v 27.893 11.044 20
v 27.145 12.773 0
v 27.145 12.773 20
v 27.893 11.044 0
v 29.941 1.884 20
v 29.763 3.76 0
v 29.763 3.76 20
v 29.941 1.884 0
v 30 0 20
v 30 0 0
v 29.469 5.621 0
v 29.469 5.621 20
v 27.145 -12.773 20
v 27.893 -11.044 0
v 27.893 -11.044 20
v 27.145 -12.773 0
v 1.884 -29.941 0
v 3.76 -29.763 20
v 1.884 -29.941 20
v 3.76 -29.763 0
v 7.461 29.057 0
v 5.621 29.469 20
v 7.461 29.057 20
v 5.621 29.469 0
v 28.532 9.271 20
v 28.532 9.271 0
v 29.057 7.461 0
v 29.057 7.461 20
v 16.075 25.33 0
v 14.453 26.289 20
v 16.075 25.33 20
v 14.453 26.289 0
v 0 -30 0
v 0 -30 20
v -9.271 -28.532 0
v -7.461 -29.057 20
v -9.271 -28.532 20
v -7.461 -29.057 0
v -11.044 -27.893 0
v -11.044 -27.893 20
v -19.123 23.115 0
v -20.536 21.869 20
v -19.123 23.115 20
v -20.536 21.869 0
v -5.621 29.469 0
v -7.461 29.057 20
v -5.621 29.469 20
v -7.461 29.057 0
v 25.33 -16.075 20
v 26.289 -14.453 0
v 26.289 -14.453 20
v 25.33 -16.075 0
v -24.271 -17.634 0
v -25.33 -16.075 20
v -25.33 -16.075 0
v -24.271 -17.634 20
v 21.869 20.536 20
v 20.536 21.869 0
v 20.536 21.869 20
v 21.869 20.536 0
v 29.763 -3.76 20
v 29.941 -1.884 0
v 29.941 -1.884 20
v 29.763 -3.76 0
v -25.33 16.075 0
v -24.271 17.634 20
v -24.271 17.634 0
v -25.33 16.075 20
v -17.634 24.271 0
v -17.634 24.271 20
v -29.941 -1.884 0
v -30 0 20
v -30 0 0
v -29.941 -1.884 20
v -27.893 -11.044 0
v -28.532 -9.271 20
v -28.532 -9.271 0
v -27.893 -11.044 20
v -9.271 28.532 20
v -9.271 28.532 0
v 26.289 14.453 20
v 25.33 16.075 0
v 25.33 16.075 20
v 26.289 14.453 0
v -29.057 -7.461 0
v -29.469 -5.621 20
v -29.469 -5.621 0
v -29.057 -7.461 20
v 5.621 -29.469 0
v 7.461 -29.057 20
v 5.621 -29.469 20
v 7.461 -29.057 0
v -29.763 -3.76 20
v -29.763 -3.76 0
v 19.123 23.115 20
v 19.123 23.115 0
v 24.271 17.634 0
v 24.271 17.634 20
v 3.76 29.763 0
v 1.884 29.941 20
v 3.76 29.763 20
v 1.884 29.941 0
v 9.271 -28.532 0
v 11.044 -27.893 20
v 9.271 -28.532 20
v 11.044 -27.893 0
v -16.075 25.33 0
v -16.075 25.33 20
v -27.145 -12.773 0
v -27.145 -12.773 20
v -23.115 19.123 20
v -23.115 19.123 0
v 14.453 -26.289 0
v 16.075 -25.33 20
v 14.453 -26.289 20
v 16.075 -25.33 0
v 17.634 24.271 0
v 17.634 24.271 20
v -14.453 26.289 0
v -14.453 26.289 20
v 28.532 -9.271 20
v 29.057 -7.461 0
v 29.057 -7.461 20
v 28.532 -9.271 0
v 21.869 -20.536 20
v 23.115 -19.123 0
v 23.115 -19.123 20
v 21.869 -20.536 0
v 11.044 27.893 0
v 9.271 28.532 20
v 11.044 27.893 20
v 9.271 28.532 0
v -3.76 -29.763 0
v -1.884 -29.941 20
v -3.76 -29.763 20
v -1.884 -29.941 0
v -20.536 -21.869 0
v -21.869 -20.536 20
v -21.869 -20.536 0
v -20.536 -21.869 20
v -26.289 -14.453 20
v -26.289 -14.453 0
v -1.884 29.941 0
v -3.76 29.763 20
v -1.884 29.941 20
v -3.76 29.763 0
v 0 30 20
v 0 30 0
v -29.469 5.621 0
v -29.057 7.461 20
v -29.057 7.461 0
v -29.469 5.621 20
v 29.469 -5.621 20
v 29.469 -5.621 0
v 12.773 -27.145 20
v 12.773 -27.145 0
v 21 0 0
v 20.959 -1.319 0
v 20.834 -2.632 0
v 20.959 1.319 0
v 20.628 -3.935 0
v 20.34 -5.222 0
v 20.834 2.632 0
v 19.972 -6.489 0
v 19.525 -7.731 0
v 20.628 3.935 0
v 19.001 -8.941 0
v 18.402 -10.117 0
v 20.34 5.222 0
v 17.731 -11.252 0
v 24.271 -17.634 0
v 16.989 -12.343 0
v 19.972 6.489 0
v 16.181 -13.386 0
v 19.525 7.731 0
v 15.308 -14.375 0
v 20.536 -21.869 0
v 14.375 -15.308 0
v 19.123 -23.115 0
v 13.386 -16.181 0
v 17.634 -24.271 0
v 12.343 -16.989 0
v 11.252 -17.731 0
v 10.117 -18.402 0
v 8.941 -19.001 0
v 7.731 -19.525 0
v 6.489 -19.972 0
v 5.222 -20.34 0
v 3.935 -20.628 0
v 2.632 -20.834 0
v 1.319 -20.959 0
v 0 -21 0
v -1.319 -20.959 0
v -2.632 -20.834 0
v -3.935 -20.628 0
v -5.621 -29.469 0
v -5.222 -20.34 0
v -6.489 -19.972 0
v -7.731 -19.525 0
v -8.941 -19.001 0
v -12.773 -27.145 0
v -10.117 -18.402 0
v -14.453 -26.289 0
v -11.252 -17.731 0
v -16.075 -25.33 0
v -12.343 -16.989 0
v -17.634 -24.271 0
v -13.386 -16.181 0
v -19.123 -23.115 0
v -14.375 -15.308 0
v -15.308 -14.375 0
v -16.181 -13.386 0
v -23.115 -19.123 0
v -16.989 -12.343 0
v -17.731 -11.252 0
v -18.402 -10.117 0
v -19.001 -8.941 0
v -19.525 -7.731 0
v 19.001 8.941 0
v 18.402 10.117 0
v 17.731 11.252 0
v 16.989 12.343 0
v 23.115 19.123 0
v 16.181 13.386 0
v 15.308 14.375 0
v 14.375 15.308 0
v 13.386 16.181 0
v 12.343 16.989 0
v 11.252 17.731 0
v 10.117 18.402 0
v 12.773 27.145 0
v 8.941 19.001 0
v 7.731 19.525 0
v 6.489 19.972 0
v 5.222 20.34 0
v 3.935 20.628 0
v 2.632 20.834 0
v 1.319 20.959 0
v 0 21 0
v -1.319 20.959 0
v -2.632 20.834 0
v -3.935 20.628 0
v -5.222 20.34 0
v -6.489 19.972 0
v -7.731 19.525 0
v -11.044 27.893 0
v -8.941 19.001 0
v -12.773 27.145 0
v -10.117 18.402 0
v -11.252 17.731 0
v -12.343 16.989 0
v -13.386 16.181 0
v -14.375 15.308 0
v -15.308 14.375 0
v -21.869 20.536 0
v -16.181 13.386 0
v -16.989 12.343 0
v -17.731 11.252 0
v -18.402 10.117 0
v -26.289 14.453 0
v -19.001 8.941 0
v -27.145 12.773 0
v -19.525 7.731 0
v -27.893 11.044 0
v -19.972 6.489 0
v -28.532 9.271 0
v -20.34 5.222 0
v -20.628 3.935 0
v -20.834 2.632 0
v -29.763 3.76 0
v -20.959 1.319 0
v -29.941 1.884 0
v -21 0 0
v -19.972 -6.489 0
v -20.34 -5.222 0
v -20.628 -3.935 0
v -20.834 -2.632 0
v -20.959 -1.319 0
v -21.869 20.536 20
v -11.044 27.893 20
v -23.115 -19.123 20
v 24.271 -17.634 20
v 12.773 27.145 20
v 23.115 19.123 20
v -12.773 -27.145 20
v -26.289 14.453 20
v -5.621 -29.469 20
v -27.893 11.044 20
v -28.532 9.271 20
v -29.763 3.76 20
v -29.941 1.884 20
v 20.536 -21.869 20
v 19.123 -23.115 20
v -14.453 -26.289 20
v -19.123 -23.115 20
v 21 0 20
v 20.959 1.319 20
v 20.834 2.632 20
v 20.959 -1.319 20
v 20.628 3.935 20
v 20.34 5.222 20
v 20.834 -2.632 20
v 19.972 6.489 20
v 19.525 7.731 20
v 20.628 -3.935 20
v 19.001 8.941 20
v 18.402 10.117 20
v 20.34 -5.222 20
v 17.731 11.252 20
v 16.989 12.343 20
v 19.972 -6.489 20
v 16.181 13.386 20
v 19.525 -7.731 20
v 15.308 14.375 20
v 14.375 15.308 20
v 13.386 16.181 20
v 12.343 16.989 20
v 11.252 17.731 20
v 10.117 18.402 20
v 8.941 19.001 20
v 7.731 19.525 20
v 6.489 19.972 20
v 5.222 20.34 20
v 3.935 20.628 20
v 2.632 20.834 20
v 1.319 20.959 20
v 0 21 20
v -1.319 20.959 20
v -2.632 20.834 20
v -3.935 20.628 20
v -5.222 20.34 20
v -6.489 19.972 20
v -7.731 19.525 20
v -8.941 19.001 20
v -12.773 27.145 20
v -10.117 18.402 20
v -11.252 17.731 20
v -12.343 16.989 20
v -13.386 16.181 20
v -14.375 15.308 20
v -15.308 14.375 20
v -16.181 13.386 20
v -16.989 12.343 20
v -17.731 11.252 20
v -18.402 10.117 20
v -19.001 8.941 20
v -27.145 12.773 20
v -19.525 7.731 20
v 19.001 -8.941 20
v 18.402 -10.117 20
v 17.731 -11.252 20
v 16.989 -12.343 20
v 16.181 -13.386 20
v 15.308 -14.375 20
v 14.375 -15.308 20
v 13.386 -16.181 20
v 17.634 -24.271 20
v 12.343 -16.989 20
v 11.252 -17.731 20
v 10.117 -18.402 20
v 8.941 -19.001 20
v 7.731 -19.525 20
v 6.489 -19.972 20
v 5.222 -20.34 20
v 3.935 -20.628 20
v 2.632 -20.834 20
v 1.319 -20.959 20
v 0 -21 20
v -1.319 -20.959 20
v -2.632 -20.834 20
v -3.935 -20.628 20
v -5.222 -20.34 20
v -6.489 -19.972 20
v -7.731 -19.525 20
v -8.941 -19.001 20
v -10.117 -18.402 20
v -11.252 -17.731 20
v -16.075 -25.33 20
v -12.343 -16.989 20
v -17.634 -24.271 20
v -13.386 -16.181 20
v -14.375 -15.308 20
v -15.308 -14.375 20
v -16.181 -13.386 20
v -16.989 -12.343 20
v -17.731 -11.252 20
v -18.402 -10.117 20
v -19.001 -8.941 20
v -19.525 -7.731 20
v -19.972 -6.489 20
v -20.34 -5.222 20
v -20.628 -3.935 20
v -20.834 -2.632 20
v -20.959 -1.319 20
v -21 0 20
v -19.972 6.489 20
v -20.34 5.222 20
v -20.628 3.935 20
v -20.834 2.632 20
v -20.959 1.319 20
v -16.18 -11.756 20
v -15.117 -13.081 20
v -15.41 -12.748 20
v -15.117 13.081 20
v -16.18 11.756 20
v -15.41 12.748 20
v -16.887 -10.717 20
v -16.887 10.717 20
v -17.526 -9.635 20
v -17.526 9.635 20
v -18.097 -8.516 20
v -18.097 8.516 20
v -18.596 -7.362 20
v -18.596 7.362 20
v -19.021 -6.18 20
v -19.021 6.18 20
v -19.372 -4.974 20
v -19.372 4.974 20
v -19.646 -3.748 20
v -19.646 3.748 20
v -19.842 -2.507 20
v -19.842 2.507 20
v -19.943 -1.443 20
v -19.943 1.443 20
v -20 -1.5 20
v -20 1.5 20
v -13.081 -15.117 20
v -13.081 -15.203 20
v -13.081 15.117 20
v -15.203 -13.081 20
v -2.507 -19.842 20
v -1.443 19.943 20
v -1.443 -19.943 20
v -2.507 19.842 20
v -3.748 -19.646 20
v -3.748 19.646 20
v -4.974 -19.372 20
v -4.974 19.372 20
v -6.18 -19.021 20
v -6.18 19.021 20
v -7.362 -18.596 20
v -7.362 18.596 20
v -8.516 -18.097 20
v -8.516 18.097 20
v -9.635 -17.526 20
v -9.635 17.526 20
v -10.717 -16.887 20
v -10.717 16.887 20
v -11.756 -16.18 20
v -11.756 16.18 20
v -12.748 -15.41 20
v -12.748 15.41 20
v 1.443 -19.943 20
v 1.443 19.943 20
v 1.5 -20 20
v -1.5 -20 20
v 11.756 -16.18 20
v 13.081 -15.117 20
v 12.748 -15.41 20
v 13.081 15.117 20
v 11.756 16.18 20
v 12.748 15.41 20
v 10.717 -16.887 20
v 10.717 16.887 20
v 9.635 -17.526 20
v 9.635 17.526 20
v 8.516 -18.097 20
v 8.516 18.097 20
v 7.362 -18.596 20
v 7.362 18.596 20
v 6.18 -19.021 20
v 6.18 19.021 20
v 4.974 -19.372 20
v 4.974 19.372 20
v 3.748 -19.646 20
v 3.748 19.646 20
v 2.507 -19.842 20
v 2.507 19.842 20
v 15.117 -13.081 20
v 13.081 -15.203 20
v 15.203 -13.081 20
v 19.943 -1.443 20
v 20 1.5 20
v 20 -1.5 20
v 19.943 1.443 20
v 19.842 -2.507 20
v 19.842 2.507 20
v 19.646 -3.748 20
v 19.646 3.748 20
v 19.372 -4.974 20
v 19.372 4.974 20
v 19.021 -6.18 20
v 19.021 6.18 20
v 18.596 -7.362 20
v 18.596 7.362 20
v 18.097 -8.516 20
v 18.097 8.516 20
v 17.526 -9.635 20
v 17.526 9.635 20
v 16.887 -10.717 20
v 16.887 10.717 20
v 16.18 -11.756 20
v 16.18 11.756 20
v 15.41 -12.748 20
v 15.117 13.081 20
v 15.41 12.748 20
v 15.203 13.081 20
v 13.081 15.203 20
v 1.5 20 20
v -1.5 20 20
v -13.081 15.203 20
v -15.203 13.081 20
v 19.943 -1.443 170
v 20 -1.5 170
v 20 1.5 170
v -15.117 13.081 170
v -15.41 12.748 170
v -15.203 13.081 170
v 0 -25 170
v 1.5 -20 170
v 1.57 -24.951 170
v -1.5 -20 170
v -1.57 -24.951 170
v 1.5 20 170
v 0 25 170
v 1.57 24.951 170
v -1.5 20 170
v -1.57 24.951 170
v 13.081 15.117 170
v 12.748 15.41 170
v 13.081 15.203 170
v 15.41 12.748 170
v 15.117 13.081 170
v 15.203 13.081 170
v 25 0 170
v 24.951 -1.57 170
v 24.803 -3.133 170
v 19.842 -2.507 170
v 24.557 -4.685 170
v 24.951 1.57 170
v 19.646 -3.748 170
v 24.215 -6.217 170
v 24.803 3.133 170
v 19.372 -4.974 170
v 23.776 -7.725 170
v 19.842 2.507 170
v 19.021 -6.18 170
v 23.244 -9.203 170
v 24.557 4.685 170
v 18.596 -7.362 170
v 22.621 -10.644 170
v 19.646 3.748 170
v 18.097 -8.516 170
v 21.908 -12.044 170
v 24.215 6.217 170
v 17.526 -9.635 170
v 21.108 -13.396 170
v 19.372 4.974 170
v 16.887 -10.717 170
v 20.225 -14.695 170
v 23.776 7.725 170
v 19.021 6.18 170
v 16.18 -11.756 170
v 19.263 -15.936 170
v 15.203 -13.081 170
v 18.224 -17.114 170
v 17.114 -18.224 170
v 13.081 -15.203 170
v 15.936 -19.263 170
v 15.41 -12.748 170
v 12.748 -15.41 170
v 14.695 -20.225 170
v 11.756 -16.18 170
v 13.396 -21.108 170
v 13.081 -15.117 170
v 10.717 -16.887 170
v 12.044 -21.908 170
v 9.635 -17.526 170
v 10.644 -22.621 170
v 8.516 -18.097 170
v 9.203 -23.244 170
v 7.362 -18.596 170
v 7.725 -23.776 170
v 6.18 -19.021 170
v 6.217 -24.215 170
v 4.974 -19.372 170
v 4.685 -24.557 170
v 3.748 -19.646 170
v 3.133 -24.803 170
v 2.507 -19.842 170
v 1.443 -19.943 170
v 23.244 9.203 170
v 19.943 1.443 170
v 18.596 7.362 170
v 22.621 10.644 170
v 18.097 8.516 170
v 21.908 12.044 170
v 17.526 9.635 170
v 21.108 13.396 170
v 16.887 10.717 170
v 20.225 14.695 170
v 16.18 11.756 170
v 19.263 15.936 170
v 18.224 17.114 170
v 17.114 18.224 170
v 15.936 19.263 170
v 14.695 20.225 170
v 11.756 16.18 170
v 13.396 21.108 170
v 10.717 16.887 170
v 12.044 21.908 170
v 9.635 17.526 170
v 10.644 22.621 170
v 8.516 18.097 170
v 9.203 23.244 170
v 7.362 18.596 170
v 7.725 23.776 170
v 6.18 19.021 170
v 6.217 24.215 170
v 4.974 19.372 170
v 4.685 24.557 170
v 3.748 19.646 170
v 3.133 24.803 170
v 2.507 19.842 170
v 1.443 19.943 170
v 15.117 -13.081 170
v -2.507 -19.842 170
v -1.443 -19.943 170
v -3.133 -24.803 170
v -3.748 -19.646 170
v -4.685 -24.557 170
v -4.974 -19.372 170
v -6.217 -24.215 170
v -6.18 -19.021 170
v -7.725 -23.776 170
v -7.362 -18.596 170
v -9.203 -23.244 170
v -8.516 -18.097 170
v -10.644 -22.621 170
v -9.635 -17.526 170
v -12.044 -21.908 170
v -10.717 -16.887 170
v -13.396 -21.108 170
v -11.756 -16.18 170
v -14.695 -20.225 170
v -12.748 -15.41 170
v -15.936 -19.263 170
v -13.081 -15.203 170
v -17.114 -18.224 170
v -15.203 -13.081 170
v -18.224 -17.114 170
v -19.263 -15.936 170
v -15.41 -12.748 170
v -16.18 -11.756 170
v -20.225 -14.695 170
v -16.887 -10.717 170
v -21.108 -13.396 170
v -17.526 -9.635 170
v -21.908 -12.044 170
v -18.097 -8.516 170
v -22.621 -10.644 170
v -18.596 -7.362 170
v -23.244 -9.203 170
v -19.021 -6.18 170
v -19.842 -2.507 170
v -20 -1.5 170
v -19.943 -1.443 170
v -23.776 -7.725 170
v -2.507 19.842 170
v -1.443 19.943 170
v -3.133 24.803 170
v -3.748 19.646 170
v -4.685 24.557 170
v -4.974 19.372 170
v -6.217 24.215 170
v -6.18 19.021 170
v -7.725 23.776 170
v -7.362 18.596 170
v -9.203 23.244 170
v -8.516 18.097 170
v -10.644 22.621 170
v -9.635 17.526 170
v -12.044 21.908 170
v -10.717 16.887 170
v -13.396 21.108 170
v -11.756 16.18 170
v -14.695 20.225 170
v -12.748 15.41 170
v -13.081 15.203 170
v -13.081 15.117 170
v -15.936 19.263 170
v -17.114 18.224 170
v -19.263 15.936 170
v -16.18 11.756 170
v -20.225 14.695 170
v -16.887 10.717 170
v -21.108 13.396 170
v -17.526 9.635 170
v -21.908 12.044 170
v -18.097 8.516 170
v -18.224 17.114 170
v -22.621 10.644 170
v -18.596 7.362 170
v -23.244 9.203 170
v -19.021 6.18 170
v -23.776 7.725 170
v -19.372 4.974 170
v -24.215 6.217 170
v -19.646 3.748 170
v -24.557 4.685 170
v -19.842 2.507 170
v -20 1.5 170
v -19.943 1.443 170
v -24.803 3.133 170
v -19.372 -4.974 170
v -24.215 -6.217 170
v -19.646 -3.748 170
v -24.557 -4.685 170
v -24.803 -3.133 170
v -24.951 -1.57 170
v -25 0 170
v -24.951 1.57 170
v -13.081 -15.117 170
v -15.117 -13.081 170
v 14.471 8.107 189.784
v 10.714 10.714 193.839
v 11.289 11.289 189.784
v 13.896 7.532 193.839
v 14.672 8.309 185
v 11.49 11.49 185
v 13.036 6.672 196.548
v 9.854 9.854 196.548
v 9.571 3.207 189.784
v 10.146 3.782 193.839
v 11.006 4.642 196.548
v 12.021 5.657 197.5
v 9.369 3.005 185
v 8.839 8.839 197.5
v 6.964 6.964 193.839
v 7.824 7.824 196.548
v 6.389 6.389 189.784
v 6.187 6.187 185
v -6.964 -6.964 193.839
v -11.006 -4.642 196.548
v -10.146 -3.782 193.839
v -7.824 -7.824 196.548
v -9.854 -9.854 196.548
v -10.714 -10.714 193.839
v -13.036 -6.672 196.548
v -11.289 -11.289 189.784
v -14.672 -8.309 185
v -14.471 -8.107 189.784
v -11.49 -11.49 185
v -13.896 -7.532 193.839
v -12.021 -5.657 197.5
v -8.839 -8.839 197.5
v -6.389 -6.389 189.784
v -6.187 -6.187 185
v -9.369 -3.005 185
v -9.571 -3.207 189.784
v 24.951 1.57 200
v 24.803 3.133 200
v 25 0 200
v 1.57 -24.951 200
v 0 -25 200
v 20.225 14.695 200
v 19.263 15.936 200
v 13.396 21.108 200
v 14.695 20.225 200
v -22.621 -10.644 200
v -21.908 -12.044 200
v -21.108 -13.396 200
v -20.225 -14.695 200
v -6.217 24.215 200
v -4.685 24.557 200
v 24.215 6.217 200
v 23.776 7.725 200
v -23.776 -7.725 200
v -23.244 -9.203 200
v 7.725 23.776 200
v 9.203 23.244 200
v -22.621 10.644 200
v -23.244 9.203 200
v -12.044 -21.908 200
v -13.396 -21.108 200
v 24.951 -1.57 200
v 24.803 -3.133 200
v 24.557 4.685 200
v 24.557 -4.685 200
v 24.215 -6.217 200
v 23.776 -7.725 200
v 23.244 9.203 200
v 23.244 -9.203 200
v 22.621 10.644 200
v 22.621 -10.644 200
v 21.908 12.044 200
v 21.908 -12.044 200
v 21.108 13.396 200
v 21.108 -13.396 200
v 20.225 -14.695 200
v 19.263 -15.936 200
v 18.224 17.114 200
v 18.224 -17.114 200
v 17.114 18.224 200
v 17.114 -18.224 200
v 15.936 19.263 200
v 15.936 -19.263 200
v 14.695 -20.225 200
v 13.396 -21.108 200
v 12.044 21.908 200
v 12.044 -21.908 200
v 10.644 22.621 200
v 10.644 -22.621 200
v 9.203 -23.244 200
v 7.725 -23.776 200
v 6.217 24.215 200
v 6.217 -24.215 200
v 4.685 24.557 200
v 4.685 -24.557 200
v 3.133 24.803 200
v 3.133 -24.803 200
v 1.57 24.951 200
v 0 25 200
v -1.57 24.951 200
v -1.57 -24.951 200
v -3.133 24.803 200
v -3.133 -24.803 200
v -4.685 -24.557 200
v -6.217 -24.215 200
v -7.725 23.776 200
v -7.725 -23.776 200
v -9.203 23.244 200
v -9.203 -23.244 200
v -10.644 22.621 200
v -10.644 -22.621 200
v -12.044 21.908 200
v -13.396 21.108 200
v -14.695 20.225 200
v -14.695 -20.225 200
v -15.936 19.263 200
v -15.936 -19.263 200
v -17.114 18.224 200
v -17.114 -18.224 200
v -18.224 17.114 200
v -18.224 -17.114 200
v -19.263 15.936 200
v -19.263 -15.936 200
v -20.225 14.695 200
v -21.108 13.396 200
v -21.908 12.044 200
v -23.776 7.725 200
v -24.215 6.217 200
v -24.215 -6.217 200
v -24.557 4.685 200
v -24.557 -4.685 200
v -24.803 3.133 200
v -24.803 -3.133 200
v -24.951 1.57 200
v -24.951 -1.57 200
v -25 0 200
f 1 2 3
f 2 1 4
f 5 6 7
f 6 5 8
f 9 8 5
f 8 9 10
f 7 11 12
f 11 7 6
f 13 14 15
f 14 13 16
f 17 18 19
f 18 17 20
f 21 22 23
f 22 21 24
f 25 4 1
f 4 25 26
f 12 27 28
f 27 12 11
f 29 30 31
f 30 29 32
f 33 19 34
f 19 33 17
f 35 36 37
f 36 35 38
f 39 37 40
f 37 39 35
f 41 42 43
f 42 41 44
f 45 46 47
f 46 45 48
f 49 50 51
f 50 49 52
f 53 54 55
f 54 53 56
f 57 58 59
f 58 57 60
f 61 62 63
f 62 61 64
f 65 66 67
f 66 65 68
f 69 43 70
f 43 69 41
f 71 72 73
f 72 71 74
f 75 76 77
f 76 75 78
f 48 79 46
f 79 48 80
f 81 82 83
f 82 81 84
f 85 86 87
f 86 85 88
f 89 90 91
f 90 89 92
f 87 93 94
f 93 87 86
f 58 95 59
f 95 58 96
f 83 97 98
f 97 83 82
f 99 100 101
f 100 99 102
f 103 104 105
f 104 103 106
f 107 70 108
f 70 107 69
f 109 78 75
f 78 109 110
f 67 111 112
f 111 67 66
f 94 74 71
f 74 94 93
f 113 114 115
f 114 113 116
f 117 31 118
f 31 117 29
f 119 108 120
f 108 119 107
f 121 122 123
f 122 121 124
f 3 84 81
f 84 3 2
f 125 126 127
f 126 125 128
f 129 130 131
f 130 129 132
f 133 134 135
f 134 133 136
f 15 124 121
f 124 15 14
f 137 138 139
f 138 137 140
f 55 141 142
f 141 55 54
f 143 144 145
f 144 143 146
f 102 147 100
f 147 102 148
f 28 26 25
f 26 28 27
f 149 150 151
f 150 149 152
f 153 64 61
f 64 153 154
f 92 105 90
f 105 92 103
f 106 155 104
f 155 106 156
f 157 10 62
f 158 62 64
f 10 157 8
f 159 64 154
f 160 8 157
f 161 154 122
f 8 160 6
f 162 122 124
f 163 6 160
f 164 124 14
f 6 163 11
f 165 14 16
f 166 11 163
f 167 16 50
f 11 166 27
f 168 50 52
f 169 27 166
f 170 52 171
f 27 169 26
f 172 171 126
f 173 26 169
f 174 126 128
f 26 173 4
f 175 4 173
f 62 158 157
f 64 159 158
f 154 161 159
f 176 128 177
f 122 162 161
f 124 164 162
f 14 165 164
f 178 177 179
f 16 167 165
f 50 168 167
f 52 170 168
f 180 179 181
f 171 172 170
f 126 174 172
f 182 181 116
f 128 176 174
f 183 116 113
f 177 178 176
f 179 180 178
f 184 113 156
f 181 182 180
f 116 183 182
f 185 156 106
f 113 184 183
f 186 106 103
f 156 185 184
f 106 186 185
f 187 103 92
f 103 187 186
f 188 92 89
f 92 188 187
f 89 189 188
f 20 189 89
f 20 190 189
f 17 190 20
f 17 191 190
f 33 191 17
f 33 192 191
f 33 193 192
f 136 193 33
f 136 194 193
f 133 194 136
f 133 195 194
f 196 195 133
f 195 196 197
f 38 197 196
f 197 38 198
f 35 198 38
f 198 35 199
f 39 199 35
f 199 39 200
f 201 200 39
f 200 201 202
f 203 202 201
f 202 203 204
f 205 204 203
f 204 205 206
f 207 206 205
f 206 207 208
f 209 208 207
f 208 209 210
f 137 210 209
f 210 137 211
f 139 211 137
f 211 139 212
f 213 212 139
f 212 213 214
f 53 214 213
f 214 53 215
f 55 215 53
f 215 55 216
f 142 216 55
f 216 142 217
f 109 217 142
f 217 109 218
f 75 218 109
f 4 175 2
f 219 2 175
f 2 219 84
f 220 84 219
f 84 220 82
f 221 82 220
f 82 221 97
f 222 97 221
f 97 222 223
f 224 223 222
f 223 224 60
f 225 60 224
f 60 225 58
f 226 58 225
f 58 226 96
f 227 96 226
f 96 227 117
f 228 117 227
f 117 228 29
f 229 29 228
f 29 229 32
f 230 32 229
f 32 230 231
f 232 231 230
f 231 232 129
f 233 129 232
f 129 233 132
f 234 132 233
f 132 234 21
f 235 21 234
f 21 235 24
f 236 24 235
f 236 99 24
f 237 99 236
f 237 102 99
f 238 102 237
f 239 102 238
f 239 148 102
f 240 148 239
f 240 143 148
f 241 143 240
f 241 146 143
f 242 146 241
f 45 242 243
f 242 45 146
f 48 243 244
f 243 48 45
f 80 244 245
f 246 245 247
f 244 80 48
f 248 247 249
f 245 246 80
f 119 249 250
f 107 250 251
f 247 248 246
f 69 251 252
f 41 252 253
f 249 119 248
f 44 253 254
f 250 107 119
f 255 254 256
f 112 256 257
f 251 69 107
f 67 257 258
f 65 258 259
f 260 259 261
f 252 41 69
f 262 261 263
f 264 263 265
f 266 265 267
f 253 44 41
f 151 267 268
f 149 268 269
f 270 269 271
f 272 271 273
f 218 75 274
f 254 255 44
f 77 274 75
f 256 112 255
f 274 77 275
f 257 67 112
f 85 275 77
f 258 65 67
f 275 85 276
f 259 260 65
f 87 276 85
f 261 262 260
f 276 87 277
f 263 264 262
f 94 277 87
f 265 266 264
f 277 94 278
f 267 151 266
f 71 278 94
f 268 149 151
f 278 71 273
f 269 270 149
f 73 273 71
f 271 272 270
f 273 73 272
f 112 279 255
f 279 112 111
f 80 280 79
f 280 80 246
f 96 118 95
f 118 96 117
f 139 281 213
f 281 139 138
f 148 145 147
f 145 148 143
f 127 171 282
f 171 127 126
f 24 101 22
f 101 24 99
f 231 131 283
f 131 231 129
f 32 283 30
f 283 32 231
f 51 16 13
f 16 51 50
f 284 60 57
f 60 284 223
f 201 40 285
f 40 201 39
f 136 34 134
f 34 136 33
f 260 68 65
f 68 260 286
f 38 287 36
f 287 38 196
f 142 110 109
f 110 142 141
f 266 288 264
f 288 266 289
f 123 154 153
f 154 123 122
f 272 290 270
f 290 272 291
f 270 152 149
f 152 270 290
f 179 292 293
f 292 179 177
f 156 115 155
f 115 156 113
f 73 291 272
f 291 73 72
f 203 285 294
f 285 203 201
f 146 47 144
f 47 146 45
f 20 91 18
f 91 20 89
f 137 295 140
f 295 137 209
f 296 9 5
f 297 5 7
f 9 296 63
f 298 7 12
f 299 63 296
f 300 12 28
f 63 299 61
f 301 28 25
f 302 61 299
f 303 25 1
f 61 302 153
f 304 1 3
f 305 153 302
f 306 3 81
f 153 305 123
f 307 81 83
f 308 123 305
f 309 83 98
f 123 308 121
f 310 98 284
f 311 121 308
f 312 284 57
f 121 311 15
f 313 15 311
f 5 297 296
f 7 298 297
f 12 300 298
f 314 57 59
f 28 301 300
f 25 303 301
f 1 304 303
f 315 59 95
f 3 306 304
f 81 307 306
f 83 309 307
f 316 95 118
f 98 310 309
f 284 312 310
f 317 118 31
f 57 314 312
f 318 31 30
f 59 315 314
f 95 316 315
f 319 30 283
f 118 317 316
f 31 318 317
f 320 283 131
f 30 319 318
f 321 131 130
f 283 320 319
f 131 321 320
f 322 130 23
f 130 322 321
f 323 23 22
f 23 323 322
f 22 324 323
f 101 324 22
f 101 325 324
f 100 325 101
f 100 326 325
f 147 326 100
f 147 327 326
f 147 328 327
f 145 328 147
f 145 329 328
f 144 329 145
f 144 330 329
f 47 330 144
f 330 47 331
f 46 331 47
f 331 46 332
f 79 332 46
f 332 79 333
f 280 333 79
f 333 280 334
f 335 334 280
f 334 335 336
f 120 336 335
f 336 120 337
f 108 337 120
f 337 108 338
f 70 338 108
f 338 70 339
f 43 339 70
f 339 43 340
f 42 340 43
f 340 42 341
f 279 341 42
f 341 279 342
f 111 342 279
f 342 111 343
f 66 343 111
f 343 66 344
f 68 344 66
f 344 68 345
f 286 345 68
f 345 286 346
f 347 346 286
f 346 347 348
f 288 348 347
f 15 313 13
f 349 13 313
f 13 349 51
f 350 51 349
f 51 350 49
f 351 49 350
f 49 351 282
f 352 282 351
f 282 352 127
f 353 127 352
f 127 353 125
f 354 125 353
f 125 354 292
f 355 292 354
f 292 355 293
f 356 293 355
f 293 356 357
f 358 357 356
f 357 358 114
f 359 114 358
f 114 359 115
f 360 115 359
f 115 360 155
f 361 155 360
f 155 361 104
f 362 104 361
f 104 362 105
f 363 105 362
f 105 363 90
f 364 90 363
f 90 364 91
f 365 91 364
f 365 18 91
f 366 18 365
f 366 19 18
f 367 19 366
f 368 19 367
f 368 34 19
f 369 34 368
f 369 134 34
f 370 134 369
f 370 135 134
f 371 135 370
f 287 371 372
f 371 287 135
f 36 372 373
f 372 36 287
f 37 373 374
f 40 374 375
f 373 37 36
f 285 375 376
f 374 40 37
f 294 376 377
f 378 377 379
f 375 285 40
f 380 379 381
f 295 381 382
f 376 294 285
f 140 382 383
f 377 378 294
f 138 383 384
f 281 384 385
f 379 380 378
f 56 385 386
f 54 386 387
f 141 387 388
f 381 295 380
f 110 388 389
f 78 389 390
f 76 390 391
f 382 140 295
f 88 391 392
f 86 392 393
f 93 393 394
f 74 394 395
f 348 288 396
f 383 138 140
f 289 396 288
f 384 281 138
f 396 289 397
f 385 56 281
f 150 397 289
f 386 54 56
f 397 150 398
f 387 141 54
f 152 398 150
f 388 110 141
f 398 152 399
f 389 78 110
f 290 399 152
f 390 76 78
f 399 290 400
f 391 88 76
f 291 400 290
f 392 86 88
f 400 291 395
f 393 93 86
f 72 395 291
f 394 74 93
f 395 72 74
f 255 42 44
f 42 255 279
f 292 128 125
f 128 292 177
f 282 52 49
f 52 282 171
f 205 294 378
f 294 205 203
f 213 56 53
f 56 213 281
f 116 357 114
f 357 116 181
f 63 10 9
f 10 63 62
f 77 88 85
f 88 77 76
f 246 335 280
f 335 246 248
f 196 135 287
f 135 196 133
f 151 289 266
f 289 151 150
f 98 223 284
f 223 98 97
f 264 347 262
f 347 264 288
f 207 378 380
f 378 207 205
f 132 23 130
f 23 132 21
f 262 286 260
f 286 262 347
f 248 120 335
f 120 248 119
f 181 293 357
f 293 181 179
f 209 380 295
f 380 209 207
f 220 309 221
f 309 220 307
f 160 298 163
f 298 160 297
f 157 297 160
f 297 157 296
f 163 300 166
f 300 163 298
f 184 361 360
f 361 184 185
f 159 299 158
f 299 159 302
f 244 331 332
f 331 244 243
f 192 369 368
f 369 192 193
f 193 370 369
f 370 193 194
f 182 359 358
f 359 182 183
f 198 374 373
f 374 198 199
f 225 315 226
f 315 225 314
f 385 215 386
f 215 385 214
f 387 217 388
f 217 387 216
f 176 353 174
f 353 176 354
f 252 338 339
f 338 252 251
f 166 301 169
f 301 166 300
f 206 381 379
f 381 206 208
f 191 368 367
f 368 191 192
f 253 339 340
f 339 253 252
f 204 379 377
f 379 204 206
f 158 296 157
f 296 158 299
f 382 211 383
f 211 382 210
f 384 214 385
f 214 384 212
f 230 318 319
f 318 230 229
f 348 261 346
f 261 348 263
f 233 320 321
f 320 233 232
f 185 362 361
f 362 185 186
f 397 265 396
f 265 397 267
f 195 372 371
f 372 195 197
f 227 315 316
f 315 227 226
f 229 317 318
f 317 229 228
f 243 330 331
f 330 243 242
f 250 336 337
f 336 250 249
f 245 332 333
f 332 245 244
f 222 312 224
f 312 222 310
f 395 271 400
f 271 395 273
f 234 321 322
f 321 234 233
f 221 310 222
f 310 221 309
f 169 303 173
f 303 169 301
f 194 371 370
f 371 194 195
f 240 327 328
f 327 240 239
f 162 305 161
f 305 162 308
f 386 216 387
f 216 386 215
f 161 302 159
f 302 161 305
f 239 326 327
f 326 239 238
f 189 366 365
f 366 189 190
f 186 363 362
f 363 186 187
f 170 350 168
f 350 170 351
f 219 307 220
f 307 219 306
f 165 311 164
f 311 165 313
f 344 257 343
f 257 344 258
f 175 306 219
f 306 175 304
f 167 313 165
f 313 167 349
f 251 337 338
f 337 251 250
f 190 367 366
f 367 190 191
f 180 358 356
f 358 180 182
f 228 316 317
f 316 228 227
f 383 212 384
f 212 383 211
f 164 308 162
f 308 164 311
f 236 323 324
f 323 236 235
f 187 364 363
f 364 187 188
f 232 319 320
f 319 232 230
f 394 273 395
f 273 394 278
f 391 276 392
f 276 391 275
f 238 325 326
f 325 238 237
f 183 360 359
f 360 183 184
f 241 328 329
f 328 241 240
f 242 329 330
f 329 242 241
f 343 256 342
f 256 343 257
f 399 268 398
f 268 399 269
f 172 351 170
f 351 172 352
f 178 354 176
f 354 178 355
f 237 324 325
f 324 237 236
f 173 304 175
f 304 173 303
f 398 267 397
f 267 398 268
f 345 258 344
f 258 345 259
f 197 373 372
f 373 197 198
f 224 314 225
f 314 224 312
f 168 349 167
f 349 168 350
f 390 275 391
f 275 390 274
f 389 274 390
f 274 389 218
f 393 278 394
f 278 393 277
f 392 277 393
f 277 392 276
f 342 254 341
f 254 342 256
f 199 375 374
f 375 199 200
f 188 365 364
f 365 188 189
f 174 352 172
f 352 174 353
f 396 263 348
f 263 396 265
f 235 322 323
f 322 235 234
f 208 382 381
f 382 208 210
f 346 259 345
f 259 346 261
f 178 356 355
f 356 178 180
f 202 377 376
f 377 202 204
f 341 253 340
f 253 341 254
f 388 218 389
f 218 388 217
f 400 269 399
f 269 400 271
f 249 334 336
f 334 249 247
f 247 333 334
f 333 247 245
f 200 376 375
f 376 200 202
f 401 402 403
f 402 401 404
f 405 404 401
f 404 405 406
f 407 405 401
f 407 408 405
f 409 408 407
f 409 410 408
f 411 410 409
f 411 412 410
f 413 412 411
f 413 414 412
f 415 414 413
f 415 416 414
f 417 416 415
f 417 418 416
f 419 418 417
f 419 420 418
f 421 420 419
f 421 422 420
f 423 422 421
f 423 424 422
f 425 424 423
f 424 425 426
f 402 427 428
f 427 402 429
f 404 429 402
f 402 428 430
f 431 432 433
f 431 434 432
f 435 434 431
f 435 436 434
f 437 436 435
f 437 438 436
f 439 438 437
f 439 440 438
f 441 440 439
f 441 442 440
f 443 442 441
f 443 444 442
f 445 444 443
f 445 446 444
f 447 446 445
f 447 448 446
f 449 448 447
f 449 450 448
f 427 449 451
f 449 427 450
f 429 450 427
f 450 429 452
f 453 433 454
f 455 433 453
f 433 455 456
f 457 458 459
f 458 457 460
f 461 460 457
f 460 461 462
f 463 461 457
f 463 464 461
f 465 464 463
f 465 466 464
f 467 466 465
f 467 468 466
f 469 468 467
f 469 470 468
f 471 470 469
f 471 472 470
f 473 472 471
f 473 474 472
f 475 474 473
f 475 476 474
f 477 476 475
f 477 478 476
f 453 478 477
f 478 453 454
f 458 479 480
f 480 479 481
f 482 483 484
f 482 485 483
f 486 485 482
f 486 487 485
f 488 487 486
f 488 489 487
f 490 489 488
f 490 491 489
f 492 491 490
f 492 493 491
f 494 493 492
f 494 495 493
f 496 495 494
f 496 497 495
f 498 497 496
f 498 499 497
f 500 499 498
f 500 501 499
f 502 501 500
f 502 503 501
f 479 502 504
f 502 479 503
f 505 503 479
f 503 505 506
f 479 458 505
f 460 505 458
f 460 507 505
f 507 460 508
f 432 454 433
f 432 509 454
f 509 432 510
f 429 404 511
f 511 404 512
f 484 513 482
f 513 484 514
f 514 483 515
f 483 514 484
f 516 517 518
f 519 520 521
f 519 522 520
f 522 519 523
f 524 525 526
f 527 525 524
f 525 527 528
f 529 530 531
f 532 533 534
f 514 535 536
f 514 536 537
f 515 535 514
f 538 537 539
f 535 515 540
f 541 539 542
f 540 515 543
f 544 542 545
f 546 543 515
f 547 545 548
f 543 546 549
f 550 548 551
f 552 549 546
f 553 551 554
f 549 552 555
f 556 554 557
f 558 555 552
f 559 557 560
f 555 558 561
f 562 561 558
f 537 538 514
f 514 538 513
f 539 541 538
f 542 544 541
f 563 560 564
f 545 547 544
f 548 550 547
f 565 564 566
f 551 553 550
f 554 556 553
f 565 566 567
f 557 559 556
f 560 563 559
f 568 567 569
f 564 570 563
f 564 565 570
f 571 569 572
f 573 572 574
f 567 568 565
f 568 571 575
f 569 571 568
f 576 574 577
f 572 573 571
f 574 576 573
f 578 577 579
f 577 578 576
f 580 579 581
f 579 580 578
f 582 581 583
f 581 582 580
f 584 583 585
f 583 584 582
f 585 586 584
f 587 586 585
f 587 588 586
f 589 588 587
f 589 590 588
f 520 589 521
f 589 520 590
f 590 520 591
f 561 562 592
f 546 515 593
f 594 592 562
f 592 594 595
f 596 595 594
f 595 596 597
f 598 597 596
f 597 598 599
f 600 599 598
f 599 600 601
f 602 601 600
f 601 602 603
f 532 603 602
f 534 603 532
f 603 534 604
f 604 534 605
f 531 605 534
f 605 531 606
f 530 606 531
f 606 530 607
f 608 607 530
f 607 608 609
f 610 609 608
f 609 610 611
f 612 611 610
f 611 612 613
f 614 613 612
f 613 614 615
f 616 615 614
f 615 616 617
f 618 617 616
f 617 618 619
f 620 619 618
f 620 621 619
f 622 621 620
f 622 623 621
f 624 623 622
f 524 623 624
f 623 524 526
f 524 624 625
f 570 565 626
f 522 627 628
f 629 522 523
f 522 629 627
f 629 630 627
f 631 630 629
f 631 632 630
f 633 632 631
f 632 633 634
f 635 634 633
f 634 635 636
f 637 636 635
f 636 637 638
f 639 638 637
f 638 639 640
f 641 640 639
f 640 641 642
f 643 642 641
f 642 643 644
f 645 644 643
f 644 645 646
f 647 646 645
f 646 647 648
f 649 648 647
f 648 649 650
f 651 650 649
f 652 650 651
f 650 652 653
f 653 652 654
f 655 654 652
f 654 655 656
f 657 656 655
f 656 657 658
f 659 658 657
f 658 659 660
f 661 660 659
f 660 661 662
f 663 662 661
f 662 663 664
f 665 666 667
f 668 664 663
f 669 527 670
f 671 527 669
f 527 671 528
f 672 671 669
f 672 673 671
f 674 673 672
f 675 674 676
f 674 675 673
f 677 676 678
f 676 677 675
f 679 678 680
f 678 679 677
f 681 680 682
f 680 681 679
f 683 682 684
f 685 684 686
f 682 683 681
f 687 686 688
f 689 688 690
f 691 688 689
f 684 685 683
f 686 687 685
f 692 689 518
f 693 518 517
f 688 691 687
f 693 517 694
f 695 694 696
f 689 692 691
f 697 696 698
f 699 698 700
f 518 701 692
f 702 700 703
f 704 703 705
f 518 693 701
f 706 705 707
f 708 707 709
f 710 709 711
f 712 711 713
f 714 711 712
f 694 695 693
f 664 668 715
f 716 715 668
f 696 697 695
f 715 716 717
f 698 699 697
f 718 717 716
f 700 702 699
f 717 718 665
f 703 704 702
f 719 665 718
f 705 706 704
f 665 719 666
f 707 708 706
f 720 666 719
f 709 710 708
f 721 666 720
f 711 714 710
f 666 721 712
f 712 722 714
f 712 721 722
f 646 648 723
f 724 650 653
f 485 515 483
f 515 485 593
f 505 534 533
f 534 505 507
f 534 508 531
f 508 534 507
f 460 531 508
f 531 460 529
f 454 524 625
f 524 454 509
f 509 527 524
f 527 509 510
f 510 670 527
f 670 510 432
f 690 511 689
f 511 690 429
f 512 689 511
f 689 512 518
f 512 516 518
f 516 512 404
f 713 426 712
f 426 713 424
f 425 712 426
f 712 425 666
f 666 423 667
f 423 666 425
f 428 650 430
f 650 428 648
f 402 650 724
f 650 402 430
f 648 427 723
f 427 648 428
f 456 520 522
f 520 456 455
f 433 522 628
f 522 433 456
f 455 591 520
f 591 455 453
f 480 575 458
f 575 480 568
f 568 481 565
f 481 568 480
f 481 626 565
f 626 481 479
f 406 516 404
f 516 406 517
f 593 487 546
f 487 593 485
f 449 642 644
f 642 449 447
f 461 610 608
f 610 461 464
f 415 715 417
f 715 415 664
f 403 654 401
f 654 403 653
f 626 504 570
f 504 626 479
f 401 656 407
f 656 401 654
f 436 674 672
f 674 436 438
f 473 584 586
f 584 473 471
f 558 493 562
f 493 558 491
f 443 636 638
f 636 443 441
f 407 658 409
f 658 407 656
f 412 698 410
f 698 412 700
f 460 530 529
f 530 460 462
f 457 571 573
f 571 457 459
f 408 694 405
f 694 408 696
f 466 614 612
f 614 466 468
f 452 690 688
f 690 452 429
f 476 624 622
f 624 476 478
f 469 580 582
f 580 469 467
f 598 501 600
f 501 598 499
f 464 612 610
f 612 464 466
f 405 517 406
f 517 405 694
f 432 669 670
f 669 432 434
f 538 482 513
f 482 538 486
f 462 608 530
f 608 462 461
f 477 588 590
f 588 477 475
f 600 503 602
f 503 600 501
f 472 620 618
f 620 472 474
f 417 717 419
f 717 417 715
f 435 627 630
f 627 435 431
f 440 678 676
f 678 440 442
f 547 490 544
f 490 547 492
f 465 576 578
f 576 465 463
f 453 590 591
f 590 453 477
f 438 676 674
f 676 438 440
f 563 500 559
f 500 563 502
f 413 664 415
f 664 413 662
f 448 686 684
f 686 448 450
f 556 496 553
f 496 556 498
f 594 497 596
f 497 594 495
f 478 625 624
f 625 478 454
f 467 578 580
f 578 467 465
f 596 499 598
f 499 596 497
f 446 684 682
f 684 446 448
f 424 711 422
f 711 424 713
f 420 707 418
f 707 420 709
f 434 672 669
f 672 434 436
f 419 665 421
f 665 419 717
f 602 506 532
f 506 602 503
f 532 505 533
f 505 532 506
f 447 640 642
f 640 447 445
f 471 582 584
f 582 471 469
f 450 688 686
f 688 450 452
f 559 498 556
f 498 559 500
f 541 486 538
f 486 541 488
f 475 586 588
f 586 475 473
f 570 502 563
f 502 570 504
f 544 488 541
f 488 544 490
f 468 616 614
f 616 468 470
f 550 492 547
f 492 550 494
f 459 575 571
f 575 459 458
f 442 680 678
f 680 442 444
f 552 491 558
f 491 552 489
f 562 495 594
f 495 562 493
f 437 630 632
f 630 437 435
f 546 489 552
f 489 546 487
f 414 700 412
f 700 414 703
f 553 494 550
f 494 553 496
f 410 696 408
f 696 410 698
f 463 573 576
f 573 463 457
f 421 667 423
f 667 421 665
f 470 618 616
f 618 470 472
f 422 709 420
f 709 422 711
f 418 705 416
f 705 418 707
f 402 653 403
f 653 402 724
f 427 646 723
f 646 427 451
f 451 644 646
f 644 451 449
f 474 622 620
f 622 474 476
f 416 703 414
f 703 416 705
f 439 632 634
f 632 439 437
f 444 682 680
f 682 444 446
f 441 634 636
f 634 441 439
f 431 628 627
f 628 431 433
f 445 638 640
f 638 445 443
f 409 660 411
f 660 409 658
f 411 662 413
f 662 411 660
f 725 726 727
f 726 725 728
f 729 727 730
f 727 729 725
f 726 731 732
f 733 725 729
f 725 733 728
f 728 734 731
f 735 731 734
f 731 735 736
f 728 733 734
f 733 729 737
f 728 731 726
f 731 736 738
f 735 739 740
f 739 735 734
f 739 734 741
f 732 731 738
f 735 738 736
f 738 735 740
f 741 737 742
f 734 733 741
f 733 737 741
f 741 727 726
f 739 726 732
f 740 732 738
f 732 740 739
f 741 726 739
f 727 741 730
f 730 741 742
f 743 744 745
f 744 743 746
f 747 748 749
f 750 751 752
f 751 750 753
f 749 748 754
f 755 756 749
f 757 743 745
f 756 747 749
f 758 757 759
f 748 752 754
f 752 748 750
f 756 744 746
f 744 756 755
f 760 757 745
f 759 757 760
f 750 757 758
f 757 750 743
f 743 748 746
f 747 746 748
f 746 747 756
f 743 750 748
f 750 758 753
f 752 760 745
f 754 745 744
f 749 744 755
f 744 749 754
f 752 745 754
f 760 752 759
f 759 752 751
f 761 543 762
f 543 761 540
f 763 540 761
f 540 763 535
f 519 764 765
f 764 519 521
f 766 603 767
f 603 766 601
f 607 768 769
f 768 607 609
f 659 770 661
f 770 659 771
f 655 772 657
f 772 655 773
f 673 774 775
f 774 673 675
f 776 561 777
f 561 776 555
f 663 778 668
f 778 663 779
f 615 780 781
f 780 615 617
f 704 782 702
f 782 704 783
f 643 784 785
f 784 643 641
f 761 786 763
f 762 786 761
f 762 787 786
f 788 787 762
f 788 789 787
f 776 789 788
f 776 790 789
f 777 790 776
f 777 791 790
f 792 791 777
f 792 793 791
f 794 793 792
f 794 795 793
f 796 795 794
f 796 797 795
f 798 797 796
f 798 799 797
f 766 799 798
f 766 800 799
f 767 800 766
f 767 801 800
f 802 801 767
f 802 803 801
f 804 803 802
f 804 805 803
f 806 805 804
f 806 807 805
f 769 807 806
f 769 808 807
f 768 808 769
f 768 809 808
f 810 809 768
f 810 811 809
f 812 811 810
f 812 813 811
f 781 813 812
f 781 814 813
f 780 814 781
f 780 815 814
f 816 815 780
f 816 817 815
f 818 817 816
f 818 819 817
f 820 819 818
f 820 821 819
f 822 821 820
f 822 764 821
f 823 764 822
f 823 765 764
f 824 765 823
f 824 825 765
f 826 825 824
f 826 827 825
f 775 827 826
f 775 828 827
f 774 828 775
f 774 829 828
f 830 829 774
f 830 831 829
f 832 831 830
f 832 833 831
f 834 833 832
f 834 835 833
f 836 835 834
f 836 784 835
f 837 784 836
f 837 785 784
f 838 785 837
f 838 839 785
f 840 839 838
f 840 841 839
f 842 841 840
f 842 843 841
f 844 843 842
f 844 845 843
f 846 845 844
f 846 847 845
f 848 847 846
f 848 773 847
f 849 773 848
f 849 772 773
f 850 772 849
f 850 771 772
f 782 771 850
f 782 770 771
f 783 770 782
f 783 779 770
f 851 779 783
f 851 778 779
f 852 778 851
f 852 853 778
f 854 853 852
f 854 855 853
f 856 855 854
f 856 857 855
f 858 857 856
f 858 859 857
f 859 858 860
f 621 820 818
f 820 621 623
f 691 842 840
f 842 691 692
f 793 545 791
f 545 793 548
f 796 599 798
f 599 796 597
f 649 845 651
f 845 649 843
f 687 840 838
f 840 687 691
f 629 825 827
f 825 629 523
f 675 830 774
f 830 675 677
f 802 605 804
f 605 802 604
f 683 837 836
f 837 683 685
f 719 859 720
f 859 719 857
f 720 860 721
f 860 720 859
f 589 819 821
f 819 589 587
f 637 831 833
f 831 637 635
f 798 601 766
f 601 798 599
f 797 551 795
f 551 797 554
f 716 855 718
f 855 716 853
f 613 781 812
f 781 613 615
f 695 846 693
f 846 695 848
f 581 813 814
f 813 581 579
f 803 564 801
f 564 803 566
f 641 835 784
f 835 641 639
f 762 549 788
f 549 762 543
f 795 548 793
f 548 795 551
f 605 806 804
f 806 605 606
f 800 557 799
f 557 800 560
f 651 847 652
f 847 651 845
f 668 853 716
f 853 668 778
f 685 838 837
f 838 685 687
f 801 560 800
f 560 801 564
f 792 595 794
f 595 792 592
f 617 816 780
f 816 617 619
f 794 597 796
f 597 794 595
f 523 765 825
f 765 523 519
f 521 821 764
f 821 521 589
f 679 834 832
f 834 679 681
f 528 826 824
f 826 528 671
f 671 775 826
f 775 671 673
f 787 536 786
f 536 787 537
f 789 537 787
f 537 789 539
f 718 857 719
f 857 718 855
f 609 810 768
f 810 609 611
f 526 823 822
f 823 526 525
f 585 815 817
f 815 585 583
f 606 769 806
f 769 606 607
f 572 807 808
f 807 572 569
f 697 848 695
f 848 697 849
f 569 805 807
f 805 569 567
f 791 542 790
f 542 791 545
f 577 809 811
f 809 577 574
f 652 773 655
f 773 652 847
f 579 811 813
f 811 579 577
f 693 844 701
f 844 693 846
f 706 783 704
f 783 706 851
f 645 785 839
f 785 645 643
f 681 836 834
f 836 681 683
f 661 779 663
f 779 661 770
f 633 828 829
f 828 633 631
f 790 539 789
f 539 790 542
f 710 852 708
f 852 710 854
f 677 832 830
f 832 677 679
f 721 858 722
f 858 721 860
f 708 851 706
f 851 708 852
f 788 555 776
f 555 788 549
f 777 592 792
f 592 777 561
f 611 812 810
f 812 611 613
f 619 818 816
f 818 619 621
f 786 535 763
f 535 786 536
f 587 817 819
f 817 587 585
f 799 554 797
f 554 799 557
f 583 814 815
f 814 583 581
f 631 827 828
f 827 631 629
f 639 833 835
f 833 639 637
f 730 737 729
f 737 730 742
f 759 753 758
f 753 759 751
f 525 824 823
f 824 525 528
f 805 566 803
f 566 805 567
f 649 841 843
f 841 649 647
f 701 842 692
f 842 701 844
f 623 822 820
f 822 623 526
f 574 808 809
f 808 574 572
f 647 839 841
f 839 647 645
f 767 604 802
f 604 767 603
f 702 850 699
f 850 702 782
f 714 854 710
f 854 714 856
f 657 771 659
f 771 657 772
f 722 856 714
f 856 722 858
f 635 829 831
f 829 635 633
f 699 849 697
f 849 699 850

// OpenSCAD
// Parameters
module roman_pillar(
    height = 200,
    base_height = 20,
    capital_height = 30,
    shaft_radius = 20,
    base_radius = 30,
    capital_radius = 25,
    flute_count = 8,
    flute_depth = 1.5,
    detail = 100
) {
    // Base
    difference() {
        cylinder(h = base_height, r = base_radius, $fn = detail);
        cylinder(h = base_height + 1, r = shaft_radius + 1, $fn = detail);
    }

    // Shaft with flutes
    translate([0, 0, base_height])
    shaft(shaft_radius, height - base_height - capital_height, flute_count, flute_depth, detail);

    // Capital
    translate([0, 0, height - capital_height])
    capital(capital_radius, capital_height, detail);
}

// Shaft module with flutes
module shaft(r, h, flute_count, depth, detail) {
    cylinder(h = h, r = r, $fn = detail);

    // Create flutes
    for(i = [0:flute_count-1]) {
        angle = 360 / flute_count * i;
        rotate([0,0,angle])
        translate([r - depth, 0, 0])
        linear_extrude(height = h)
        polygon(points = [
            [0,0],
            [depth, depth],
            [depth, -depth]
        ]);
    }
}

// Capital module (Ionic style)
module capital(r, h, detail) {
    // Simple Ionic capital with volutes
    cylinder(h = h/2, r1 = r, r2 = r, $fn = detail);
    translate([0,0,h/2])
    difference() {
        cylinder(h = h/2, r1 = r, r2 = r, $fn = detail);
        for(angle = [45, 225]) {
            rotate([0,0,angle])
            translate([r*0.5,0,0])
            scale([0.3, 0.3, 1])
            rotate([90,0,0])
            cylinder(h = h/2, r = r*0.5, $fn = 16);
        }
    }
}

// Render the Roman pillar
roman_pillar();
